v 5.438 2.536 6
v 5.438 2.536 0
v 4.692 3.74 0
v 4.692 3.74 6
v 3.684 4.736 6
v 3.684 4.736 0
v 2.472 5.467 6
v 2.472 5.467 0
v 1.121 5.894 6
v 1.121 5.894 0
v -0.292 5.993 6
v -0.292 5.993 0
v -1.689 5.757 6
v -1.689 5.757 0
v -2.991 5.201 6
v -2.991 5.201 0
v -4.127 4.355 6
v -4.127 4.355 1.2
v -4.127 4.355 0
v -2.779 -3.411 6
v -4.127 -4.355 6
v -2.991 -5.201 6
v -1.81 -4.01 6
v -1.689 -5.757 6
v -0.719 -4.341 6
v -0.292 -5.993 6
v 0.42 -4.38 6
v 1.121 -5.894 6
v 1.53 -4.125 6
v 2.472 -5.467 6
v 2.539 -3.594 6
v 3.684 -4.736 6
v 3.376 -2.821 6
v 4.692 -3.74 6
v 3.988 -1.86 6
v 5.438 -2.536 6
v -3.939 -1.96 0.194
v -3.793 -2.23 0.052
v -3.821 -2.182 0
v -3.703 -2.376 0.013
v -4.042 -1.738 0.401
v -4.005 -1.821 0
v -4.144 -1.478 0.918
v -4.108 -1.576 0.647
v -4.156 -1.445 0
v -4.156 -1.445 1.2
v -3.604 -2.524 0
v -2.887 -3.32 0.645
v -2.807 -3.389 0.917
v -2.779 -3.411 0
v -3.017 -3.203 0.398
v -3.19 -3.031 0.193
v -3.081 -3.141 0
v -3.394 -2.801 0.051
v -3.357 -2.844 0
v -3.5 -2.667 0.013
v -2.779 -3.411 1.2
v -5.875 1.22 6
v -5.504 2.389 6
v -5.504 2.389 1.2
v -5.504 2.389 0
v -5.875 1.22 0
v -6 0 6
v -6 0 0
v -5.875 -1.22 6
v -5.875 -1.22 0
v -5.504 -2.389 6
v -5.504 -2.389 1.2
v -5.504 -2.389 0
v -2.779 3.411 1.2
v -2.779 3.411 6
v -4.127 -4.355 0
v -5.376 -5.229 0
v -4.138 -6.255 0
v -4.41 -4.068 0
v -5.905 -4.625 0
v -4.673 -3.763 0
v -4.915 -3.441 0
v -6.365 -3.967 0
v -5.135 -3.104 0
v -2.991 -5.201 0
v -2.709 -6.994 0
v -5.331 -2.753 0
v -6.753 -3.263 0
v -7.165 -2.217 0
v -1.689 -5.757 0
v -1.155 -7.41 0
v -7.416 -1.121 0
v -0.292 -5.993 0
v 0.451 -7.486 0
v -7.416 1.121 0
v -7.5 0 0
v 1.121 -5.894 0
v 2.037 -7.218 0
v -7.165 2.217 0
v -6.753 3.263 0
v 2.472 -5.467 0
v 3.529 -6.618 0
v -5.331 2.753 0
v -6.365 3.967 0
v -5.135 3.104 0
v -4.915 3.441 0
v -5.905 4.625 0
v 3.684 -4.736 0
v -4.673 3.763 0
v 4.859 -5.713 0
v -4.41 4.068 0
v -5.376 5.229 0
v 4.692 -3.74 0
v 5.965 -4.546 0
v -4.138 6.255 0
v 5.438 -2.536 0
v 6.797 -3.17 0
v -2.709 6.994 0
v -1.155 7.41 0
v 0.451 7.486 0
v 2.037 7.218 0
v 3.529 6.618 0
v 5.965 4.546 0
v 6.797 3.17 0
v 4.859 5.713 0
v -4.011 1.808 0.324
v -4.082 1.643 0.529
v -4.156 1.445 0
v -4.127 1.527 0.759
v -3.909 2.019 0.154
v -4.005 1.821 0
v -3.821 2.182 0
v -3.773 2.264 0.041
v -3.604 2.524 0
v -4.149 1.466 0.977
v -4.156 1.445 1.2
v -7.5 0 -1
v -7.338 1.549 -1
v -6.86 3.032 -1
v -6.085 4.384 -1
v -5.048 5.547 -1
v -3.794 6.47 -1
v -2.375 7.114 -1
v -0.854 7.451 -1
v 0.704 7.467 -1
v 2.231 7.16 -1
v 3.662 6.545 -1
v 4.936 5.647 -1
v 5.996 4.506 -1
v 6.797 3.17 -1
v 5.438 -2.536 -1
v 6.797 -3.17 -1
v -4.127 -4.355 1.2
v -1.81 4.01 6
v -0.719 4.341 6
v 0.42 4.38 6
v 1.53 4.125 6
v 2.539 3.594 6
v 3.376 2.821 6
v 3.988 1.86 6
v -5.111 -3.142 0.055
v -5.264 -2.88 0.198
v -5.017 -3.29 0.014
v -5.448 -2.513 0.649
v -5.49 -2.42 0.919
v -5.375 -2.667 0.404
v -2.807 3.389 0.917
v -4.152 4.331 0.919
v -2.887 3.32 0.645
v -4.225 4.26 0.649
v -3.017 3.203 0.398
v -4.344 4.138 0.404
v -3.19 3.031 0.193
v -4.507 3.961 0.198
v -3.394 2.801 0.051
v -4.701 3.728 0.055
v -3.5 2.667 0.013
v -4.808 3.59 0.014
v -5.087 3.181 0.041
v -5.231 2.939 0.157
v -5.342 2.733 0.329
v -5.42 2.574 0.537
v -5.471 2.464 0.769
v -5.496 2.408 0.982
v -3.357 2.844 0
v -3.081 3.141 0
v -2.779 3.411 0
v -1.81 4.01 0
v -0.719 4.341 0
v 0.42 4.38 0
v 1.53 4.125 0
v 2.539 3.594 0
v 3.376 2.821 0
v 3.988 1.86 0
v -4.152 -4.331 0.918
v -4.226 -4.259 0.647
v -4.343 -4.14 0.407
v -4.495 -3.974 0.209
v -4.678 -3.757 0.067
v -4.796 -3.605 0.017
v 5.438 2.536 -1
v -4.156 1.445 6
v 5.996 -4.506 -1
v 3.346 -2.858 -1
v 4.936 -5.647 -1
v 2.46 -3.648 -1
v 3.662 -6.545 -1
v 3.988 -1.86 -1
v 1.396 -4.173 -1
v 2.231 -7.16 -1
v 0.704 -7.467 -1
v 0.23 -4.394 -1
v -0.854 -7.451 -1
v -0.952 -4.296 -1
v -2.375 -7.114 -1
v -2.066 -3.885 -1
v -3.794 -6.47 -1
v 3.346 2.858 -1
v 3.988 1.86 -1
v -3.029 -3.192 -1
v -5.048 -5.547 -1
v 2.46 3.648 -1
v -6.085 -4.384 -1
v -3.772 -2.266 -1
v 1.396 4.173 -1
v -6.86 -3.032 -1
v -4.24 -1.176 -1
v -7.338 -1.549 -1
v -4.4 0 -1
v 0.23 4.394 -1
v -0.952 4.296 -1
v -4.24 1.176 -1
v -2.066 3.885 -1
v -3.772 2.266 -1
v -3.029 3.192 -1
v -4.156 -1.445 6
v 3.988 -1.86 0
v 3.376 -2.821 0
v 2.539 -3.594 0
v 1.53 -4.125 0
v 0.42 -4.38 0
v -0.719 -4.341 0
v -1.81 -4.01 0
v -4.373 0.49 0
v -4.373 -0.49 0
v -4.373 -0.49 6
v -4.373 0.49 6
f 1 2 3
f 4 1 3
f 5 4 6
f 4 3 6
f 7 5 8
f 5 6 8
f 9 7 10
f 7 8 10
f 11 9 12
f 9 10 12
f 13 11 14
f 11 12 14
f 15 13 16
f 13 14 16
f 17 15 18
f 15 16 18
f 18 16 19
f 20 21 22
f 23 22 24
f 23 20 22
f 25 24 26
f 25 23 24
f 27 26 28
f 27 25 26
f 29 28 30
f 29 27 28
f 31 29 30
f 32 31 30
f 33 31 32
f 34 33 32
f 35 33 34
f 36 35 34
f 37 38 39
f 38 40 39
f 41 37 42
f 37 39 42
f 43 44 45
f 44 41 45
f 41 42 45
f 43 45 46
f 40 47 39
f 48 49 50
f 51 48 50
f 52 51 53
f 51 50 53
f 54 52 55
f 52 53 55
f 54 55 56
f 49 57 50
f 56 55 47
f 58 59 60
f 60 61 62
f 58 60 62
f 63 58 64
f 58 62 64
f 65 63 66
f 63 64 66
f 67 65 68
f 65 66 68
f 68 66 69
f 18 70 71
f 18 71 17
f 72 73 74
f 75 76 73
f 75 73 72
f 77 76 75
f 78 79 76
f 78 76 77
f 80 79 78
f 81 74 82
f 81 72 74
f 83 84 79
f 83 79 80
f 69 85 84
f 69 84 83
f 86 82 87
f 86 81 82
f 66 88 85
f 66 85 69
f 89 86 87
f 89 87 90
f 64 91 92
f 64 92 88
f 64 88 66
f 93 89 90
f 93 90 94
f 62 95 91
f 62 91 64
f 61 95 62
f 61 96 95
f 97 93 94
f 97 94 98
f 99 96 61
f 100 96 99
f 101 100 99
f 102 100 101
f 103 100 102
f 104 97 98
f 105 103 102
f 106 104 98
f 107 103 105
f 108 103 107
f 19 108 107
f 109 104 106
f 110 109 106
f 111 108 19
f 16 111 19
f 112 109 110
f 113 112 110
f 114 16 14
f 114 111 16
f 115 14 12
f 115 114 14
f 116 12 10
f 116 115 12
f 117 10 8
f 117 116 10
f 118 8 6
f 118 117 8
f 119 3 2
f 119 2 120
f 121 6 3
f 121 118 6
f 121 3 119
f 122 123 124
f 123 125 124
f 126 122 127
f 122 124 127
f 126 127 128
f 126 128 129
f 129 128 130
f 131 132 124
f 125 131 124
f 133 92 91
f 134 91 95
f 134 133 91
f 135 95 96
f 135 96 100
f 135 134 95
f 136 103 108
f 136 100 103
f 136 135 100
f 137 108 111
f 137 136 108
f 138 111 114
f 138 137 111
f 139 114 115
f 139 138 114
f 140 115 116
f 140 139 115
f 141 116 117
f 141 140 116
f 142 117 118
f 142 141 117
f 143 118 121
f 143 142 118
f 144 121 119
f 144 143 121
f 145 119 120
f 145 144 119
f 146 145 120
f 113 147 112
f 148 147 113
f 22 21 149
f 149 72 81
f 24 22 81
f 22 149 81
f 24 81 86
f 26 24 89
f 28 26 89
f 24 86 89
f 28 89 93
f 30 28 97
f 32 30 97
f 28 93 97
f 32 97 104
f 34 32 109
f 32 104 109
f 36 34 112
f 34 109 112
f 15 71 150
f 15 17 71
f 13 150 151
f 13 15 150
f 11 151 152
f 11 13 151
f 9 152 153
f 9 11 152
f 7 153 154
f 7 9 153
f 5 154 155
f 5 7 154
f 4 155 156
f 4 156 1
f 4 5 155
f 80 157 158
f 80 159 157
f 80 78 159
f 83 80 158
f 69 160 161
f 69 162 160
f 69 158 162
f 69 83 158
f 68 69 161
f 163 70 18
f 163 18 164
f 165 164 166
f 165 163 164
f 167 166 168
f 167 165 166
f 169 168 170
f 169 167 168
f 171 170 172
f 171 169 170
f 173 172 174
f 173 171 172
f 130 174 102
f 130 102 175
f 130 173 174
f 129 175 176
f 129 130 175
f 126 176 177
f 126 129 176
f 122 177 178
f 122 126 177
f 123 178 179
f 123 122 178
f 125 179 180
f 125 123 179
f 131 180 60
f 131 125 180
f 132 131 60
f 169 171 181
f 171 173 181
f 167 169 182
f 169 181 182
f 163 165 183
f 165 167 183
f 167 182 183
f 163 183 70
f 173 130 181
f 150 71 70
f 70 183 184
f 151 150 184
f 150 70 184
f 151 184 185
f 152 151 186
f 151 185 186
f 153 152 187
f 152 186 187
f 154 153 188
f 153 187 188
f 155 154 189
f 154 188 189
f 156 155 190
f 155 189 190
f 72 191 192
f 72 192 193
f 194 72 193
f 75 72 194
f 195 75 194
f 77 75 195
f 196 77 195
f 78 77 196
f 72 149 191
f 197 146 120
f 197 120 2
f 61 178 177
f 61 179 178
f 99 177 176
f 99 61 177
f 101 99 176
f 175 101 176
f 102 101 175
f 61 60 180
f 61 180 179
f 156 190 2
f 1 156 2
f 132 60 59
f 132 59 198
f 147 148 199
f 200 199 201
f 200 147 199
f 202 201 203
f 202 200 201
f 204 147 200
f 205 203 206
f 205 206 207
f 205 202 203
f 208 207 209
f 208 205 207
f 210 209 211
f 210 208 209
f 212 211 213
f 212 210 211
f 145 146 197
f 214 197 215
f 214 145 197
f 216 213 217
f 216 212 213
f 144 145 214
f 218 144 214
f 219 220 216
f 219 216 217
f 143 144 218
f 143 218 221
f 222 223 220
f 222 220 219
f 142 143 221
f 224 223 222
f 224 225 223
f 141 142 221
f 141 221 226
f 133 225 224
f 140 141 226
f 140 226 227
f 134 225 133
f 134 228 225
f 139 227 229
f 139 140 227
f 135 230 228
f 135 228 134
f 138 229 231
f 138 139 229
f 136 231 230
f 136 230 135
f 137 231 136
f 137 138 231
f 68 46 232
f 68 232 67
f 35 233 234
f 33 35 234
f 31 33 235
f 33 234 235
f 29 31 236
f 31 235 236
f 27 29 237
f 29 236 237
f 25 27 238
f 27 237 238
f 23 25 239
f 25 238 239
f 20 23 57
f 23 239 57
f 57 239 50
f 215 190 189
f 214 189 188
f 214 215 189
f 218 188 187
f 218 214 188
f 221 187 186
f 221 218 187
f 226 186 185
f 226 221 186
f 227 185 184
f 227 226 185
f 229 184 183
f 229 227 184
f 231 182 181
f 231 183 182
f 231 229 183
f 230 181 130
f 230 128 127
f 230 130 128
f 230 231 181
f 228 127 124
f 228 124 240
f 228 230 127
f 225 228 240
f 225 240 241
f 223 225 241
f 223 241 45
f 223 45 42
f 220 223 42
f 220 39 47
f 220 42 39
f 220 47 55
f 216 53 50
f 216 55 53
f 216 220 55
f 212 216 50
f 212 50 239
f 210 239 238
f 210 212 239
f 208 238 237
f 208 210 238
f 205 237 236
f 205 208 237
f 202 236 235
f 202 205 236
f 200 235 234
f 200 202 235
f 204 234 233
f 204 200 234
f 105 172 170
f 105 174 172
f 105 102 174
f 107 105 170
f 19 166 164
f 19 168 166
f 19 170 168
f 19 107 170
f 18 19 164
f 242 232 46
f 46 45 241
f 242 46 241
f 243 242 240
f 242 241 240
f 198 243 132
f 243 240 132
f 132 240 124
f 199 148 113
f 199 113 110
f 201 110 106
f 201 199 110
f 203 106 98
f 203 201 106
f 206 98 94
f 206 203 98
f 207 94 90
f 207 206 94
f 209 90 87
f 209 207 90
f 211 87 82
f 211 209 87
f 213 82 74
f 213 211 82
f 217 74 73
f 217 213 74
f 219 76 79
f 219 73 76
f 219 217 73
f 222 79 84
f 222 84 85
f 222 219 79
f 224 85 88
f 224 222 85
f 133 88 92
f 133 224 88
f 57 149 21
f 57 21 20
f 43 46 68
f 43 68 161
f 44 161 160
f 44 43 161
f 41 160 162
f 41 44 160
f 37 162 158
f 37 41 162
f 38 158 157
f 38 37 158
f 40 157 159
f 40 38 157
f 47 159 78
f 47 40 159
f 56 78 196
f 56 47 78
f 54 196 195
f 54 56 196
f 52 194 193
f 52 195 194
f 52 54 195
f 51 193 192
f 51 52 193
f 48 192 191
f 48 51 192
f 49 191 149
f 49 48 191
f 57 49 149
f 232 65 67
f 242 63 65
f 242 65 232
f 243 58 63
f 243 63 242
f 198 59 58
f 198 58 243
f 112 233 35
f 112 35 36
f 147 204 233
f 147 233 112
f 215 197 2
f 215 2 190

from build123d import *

# Parameters (mm, degrees)
BOSS_EXTRUDE1_DEPTH = 6
BOSS_EXTRUDE2_START = 1
BOSS_EXTRUDE2_DEPTH = 1
CUT_EXTRUDE1_START  = -6
CUT_EXTRUDE1_DEPTH  = 6
FILLET1_R           = 1.2


with BuildPart() as part:
    # Sketch1 → Boss-Extrude1 (new body)
    with BuildSketch(Plane.XY):
        with BuildLine():
            Line((3.987754263, 1.859520352), (5.437846722, 2.53570957))
            ThreePointArc((5.437846722, 2.53570957), (-6, 0), (5.437846722, -2.53570957))
            Line((5.437846722, -2.53570957), (3.987754263, -1.859520352))
            ThreePointArc((3.987754263, -1.859520352), (-4.4, 0), (3.987754263, 1.859520352))
        make_face()
    extrude(amount=BOSS_EXTRUDE1_DEPTH)

    # Sketch2 → Boss-Extrude2 (add)
    with BuildSketch(Plane(origin=(0, 0, 0), x_dir=(-1, 0, 0), z_dir=(0, 0, -1)).offset(BOSS_EXTRUDE2_START)):
        with BuildLine():
            Line((-3.987754263, -1.859520352), (-5.437846722, -2.53570957))
            ThreePointArc((-5.437846722, -2.53570957), (6, 0), (-5.437846722, 2.53570957))
            Line((-5.437846722, 2.53570957), (-3.987754263, 1.859520352))
            ThreePointArc((-3.987754263, 1.859520352), (4.4, 0), (-3.987754263, -1.859520352))
        make_face()
        with BuildLine():
            Line((-6.797308403, 3.169636963), (-5.437846722, 2.53570957))
            ThreePointArc((-5.437846722, 2.53570957), (6, 0), (-5.437846722, -2.53570957))
            Line((-5.437846722, -2.53570957), (-6.797308403, -3.169636963))
            ThreePointArc((-6.797308403, -3.169636963), (1.623297105, -7.322220053), (7.5, 0))
            ThreePointArc((7.5, 0), (1.623297105, 7.322220053), (-6.797308403, 3.169636963))
        make_face()
    extrude(amount=-BOSS_EXTRUDE2_DEPTH)

    # Sketch3 → Cut-Extrude1 (cut)
    with BuildSketch(Plane.XY.offset(6).offset(CUT_EXTRUDE1_START)):
        with BuildLine():
            ThreePointArc((-5.503902596, -2.388944581), (-4.914912266, -3.441458618), (-4.127319149, -4.354909487))
            Line((-4.127319149, -4.354909487), (-2.779344429, -3.411047427))
            ThreePointArc((-2.779344429, -3.411047427), (-3.604268995, -2.52373632), (-4.155927876, -1.44508252))
            Line((-4.155927876, -1.44508252), (-5.503902596, -2.388944581))
        make_face()
        with BuildLine():
            ThreePointArc((-5.376200178, 5.229385398), (-6.143640332, 4.301823273), (-6.752783625, 3.263420492))
            Line((-6.752783625, 3.263420492), (-5.503902596, 2.388944581))
            ThreePointArc((-5.503902596, 2.388944581), (-4.914912266, 3.441458618), (-4.127319149, 4.354909487))
            Line((-4.127319149, 4.354909487), (-5.376200178, 5.229385398))
        make_face()
        with BuildLine():
            ThreePointArc((-4.127319149, 4.354909487), (-4.914912266, 3.441458618), (-5.503902596, 2.388944581))
            Line((-5.503902596, 2.388944581), (-4.155927876, 1.44508252))
            ThreePointArc((-4.155927876, 1.44508252), (-3.604268995, 2.52373632), (-2.779344429, 3.411047427))
            Line((-2.779344429, 3.411047427), (-4.127319149, 4.354909487))
        make_face()
        with BuildLine():
            ThreePointArc((-6.752783625, -3.263420492), (-6.143640332, -4.301823273), (-5.376200178, -5.229385398))
            Line((-5.376200178, -5.229385398), (-4.127319149, -4.354909487))
            ThreePointArc((-4.127319149, -4.354909487), (-4.914912266, -3.441458618), (-5.503902596, -2.388944581))
            Line((-5.503902596, -2.388944581), (-6.752783625, -3.263420492))
        make_face()
    extrude(amount=CUT_EXTRUDE1_DEPTH, mode=Mode.SUBTRACT)

    # Fillet1
    # the kernel refuses this fillet: 1.2 mm, written as the material it adds along each edge
    with BuildSketch(Plane(origin=(-6.584775282, -6.075638796, 0), x_dir=(-0.5735764363510464, 0.8191520442889915, 0), z_dir=(0.8191520442889916, 0.5735764363510465, 0))) as fillet1_piece_1_section:
        with BuildLine():
            CenterArc((FILLET1_R, FILLET1_R), FILLET1_R, 180, 90)
            Line((0, FILLET1_R), (0, 0))
            Line((0, 0), (FILLET1_R, 0))
        make_face()
    fillet1_piece_1 = extrude(amount=7.645573285, mode=Mode.PRIVATE)
    fillet1_piece_1 = fillet1_piece_1 - Plane(origin=(0, 0, 0.272987172), x_dir=(0.9063077870366507, 0.4226182617406977, 0), z_dir=(0, 0, -1)) * Cylinder(4.4, 21, mode=Mode.PRIVATE)
    fillet1_piece_1 = fillet1_piece_1 & Plane(origin=(0, 0, 0.272987172), x_dir=(0.9063077870366507, 0.4226182617406977, 0), z_dir=(0, 0, -1)) * Cylinder(6, 21, mode=Mode.PRIVATE)
    add(fillet1_piece_1)
    with BuildSketch(Plane(origin=(-1.698471743, 0.275646789, 0), x_dir=(0.5735764363510474, -0.8191520442889908, 0), z_dir=(-0.819152044288991, -0.5735764363510474, 0))) as fillet1_piece_2_section:
        with BuildLine():
            CenterArc((FILLET1_R, FILLET1_R), FILLET1_R, 180, 90)
            Line((0, FILLET1_R), (0, 0))
            Line((0, 0), (FILLET1_R, 0))
        make_face()
    fillet1_piece_2 = extrude(amount=7.645573285, mode=Mode.PRIVATE)
    fillet1_piece_2 = fillet1_piece_2 - Plane(origin=(0, 0, 0.272986937), x_dir=(0.9063077870366507, 0.4226182617406977, 0), z_dir=(0, 0, -1)) * Cylinder(4.4, 21, mode=Mode.PRIVATE)
    fillet1_piece_2 = fillet1_piece_2 & Plane(origin=(0, 0, 0.272986937), x_dir=(0.9063077870366507, 0.4226182617406977, 0), z_dir=(0, 0, -1)) * Cylinder(6, 21, mode=Mode.PRIVATE)
    add(fillet1_piece_2)
    with BuildSketch(Plane(origin=(-0.321888296, 1.690318118, 0), x_dir=(0, 0, 1), z_dir=(-0.8191520442889906, 0.5735764363510478, 0))) as fillet1_piece_3_section:
        with BuildLine():
            CenterArc((FILLET1_R, -FILLET1_R), FILLET1_R, 90, 90)
            Line((0, -FILLET1_R), (0, 0))
            Line((0, 0), (FILLET1_R, 0))
        make_face()
    fillet1_piece_3 = extrude(amount=7.645573285, mode=Mode.PRIVATE)
    fillet1_piece_3 = fillet1_piece_3 - Plane(origin=(0, 0, 0.272987798), x_dir=(0.9063077870366507, -0.4226182617406978, 0), z_dir=(0, 0, -1)) * Cylinder(4.4, 21, mode=Mode.PRIVATE)
    fillet1_piece_3 = fillet1_piece_3 & Plane(origin=(0, 0, 0.272987798), x_dir=(0.9063077870366507, 0.4226182617406977, 0), z_dir=(0, 0, -1)) * Cylinder(6, 21, mode=Mode.PRIVATE)
    add(fillet1_piece_3)
    with BuildSketch(Plane(origin=(-1.698471743, -0.275646789, 0), x_dir=(0.5735764363510463, 0.8191520442889917, 0), z_dir=(-0.8191520442889917, 0.5735764363510463, 0))) as fillet1_piece_4_section:
        with BuildLine():
            CenterArc((FILLET1_R, -FILLET1_R), FILLET1_R, 90, 90)
            Line((0, -FILLET1_R), (0, 0))
            Line((0, 0), (FILLET1_R, 0))
        make_face()
    fillet1_piece_4 = extrude(amount=7.645573285, mode=Mode.PRIVATE)
    fillet1_piece_4 = fillet1_piece_4 - Plane(origin=(0, 0, 0.27298714), x_dir=(0.9063077870366507, 0.4226182617406977, 0), z_dir=(0, 0, -1)) * Cylinder(4.4, 21, mode=Mode.PRIVATE)
    fillet1_piece_4 = fillet1_piece_4 & Plane(origin=(0, 0, 0.27298714), x_dir=(0.9063077870366507, 0.4226182617406977, 0), z_dir=(0, 0, -1)) * Cylinder(6, 21, mode=Mode.PRIVATE)
    add(fillet1_piece_4)


solid = part.part
